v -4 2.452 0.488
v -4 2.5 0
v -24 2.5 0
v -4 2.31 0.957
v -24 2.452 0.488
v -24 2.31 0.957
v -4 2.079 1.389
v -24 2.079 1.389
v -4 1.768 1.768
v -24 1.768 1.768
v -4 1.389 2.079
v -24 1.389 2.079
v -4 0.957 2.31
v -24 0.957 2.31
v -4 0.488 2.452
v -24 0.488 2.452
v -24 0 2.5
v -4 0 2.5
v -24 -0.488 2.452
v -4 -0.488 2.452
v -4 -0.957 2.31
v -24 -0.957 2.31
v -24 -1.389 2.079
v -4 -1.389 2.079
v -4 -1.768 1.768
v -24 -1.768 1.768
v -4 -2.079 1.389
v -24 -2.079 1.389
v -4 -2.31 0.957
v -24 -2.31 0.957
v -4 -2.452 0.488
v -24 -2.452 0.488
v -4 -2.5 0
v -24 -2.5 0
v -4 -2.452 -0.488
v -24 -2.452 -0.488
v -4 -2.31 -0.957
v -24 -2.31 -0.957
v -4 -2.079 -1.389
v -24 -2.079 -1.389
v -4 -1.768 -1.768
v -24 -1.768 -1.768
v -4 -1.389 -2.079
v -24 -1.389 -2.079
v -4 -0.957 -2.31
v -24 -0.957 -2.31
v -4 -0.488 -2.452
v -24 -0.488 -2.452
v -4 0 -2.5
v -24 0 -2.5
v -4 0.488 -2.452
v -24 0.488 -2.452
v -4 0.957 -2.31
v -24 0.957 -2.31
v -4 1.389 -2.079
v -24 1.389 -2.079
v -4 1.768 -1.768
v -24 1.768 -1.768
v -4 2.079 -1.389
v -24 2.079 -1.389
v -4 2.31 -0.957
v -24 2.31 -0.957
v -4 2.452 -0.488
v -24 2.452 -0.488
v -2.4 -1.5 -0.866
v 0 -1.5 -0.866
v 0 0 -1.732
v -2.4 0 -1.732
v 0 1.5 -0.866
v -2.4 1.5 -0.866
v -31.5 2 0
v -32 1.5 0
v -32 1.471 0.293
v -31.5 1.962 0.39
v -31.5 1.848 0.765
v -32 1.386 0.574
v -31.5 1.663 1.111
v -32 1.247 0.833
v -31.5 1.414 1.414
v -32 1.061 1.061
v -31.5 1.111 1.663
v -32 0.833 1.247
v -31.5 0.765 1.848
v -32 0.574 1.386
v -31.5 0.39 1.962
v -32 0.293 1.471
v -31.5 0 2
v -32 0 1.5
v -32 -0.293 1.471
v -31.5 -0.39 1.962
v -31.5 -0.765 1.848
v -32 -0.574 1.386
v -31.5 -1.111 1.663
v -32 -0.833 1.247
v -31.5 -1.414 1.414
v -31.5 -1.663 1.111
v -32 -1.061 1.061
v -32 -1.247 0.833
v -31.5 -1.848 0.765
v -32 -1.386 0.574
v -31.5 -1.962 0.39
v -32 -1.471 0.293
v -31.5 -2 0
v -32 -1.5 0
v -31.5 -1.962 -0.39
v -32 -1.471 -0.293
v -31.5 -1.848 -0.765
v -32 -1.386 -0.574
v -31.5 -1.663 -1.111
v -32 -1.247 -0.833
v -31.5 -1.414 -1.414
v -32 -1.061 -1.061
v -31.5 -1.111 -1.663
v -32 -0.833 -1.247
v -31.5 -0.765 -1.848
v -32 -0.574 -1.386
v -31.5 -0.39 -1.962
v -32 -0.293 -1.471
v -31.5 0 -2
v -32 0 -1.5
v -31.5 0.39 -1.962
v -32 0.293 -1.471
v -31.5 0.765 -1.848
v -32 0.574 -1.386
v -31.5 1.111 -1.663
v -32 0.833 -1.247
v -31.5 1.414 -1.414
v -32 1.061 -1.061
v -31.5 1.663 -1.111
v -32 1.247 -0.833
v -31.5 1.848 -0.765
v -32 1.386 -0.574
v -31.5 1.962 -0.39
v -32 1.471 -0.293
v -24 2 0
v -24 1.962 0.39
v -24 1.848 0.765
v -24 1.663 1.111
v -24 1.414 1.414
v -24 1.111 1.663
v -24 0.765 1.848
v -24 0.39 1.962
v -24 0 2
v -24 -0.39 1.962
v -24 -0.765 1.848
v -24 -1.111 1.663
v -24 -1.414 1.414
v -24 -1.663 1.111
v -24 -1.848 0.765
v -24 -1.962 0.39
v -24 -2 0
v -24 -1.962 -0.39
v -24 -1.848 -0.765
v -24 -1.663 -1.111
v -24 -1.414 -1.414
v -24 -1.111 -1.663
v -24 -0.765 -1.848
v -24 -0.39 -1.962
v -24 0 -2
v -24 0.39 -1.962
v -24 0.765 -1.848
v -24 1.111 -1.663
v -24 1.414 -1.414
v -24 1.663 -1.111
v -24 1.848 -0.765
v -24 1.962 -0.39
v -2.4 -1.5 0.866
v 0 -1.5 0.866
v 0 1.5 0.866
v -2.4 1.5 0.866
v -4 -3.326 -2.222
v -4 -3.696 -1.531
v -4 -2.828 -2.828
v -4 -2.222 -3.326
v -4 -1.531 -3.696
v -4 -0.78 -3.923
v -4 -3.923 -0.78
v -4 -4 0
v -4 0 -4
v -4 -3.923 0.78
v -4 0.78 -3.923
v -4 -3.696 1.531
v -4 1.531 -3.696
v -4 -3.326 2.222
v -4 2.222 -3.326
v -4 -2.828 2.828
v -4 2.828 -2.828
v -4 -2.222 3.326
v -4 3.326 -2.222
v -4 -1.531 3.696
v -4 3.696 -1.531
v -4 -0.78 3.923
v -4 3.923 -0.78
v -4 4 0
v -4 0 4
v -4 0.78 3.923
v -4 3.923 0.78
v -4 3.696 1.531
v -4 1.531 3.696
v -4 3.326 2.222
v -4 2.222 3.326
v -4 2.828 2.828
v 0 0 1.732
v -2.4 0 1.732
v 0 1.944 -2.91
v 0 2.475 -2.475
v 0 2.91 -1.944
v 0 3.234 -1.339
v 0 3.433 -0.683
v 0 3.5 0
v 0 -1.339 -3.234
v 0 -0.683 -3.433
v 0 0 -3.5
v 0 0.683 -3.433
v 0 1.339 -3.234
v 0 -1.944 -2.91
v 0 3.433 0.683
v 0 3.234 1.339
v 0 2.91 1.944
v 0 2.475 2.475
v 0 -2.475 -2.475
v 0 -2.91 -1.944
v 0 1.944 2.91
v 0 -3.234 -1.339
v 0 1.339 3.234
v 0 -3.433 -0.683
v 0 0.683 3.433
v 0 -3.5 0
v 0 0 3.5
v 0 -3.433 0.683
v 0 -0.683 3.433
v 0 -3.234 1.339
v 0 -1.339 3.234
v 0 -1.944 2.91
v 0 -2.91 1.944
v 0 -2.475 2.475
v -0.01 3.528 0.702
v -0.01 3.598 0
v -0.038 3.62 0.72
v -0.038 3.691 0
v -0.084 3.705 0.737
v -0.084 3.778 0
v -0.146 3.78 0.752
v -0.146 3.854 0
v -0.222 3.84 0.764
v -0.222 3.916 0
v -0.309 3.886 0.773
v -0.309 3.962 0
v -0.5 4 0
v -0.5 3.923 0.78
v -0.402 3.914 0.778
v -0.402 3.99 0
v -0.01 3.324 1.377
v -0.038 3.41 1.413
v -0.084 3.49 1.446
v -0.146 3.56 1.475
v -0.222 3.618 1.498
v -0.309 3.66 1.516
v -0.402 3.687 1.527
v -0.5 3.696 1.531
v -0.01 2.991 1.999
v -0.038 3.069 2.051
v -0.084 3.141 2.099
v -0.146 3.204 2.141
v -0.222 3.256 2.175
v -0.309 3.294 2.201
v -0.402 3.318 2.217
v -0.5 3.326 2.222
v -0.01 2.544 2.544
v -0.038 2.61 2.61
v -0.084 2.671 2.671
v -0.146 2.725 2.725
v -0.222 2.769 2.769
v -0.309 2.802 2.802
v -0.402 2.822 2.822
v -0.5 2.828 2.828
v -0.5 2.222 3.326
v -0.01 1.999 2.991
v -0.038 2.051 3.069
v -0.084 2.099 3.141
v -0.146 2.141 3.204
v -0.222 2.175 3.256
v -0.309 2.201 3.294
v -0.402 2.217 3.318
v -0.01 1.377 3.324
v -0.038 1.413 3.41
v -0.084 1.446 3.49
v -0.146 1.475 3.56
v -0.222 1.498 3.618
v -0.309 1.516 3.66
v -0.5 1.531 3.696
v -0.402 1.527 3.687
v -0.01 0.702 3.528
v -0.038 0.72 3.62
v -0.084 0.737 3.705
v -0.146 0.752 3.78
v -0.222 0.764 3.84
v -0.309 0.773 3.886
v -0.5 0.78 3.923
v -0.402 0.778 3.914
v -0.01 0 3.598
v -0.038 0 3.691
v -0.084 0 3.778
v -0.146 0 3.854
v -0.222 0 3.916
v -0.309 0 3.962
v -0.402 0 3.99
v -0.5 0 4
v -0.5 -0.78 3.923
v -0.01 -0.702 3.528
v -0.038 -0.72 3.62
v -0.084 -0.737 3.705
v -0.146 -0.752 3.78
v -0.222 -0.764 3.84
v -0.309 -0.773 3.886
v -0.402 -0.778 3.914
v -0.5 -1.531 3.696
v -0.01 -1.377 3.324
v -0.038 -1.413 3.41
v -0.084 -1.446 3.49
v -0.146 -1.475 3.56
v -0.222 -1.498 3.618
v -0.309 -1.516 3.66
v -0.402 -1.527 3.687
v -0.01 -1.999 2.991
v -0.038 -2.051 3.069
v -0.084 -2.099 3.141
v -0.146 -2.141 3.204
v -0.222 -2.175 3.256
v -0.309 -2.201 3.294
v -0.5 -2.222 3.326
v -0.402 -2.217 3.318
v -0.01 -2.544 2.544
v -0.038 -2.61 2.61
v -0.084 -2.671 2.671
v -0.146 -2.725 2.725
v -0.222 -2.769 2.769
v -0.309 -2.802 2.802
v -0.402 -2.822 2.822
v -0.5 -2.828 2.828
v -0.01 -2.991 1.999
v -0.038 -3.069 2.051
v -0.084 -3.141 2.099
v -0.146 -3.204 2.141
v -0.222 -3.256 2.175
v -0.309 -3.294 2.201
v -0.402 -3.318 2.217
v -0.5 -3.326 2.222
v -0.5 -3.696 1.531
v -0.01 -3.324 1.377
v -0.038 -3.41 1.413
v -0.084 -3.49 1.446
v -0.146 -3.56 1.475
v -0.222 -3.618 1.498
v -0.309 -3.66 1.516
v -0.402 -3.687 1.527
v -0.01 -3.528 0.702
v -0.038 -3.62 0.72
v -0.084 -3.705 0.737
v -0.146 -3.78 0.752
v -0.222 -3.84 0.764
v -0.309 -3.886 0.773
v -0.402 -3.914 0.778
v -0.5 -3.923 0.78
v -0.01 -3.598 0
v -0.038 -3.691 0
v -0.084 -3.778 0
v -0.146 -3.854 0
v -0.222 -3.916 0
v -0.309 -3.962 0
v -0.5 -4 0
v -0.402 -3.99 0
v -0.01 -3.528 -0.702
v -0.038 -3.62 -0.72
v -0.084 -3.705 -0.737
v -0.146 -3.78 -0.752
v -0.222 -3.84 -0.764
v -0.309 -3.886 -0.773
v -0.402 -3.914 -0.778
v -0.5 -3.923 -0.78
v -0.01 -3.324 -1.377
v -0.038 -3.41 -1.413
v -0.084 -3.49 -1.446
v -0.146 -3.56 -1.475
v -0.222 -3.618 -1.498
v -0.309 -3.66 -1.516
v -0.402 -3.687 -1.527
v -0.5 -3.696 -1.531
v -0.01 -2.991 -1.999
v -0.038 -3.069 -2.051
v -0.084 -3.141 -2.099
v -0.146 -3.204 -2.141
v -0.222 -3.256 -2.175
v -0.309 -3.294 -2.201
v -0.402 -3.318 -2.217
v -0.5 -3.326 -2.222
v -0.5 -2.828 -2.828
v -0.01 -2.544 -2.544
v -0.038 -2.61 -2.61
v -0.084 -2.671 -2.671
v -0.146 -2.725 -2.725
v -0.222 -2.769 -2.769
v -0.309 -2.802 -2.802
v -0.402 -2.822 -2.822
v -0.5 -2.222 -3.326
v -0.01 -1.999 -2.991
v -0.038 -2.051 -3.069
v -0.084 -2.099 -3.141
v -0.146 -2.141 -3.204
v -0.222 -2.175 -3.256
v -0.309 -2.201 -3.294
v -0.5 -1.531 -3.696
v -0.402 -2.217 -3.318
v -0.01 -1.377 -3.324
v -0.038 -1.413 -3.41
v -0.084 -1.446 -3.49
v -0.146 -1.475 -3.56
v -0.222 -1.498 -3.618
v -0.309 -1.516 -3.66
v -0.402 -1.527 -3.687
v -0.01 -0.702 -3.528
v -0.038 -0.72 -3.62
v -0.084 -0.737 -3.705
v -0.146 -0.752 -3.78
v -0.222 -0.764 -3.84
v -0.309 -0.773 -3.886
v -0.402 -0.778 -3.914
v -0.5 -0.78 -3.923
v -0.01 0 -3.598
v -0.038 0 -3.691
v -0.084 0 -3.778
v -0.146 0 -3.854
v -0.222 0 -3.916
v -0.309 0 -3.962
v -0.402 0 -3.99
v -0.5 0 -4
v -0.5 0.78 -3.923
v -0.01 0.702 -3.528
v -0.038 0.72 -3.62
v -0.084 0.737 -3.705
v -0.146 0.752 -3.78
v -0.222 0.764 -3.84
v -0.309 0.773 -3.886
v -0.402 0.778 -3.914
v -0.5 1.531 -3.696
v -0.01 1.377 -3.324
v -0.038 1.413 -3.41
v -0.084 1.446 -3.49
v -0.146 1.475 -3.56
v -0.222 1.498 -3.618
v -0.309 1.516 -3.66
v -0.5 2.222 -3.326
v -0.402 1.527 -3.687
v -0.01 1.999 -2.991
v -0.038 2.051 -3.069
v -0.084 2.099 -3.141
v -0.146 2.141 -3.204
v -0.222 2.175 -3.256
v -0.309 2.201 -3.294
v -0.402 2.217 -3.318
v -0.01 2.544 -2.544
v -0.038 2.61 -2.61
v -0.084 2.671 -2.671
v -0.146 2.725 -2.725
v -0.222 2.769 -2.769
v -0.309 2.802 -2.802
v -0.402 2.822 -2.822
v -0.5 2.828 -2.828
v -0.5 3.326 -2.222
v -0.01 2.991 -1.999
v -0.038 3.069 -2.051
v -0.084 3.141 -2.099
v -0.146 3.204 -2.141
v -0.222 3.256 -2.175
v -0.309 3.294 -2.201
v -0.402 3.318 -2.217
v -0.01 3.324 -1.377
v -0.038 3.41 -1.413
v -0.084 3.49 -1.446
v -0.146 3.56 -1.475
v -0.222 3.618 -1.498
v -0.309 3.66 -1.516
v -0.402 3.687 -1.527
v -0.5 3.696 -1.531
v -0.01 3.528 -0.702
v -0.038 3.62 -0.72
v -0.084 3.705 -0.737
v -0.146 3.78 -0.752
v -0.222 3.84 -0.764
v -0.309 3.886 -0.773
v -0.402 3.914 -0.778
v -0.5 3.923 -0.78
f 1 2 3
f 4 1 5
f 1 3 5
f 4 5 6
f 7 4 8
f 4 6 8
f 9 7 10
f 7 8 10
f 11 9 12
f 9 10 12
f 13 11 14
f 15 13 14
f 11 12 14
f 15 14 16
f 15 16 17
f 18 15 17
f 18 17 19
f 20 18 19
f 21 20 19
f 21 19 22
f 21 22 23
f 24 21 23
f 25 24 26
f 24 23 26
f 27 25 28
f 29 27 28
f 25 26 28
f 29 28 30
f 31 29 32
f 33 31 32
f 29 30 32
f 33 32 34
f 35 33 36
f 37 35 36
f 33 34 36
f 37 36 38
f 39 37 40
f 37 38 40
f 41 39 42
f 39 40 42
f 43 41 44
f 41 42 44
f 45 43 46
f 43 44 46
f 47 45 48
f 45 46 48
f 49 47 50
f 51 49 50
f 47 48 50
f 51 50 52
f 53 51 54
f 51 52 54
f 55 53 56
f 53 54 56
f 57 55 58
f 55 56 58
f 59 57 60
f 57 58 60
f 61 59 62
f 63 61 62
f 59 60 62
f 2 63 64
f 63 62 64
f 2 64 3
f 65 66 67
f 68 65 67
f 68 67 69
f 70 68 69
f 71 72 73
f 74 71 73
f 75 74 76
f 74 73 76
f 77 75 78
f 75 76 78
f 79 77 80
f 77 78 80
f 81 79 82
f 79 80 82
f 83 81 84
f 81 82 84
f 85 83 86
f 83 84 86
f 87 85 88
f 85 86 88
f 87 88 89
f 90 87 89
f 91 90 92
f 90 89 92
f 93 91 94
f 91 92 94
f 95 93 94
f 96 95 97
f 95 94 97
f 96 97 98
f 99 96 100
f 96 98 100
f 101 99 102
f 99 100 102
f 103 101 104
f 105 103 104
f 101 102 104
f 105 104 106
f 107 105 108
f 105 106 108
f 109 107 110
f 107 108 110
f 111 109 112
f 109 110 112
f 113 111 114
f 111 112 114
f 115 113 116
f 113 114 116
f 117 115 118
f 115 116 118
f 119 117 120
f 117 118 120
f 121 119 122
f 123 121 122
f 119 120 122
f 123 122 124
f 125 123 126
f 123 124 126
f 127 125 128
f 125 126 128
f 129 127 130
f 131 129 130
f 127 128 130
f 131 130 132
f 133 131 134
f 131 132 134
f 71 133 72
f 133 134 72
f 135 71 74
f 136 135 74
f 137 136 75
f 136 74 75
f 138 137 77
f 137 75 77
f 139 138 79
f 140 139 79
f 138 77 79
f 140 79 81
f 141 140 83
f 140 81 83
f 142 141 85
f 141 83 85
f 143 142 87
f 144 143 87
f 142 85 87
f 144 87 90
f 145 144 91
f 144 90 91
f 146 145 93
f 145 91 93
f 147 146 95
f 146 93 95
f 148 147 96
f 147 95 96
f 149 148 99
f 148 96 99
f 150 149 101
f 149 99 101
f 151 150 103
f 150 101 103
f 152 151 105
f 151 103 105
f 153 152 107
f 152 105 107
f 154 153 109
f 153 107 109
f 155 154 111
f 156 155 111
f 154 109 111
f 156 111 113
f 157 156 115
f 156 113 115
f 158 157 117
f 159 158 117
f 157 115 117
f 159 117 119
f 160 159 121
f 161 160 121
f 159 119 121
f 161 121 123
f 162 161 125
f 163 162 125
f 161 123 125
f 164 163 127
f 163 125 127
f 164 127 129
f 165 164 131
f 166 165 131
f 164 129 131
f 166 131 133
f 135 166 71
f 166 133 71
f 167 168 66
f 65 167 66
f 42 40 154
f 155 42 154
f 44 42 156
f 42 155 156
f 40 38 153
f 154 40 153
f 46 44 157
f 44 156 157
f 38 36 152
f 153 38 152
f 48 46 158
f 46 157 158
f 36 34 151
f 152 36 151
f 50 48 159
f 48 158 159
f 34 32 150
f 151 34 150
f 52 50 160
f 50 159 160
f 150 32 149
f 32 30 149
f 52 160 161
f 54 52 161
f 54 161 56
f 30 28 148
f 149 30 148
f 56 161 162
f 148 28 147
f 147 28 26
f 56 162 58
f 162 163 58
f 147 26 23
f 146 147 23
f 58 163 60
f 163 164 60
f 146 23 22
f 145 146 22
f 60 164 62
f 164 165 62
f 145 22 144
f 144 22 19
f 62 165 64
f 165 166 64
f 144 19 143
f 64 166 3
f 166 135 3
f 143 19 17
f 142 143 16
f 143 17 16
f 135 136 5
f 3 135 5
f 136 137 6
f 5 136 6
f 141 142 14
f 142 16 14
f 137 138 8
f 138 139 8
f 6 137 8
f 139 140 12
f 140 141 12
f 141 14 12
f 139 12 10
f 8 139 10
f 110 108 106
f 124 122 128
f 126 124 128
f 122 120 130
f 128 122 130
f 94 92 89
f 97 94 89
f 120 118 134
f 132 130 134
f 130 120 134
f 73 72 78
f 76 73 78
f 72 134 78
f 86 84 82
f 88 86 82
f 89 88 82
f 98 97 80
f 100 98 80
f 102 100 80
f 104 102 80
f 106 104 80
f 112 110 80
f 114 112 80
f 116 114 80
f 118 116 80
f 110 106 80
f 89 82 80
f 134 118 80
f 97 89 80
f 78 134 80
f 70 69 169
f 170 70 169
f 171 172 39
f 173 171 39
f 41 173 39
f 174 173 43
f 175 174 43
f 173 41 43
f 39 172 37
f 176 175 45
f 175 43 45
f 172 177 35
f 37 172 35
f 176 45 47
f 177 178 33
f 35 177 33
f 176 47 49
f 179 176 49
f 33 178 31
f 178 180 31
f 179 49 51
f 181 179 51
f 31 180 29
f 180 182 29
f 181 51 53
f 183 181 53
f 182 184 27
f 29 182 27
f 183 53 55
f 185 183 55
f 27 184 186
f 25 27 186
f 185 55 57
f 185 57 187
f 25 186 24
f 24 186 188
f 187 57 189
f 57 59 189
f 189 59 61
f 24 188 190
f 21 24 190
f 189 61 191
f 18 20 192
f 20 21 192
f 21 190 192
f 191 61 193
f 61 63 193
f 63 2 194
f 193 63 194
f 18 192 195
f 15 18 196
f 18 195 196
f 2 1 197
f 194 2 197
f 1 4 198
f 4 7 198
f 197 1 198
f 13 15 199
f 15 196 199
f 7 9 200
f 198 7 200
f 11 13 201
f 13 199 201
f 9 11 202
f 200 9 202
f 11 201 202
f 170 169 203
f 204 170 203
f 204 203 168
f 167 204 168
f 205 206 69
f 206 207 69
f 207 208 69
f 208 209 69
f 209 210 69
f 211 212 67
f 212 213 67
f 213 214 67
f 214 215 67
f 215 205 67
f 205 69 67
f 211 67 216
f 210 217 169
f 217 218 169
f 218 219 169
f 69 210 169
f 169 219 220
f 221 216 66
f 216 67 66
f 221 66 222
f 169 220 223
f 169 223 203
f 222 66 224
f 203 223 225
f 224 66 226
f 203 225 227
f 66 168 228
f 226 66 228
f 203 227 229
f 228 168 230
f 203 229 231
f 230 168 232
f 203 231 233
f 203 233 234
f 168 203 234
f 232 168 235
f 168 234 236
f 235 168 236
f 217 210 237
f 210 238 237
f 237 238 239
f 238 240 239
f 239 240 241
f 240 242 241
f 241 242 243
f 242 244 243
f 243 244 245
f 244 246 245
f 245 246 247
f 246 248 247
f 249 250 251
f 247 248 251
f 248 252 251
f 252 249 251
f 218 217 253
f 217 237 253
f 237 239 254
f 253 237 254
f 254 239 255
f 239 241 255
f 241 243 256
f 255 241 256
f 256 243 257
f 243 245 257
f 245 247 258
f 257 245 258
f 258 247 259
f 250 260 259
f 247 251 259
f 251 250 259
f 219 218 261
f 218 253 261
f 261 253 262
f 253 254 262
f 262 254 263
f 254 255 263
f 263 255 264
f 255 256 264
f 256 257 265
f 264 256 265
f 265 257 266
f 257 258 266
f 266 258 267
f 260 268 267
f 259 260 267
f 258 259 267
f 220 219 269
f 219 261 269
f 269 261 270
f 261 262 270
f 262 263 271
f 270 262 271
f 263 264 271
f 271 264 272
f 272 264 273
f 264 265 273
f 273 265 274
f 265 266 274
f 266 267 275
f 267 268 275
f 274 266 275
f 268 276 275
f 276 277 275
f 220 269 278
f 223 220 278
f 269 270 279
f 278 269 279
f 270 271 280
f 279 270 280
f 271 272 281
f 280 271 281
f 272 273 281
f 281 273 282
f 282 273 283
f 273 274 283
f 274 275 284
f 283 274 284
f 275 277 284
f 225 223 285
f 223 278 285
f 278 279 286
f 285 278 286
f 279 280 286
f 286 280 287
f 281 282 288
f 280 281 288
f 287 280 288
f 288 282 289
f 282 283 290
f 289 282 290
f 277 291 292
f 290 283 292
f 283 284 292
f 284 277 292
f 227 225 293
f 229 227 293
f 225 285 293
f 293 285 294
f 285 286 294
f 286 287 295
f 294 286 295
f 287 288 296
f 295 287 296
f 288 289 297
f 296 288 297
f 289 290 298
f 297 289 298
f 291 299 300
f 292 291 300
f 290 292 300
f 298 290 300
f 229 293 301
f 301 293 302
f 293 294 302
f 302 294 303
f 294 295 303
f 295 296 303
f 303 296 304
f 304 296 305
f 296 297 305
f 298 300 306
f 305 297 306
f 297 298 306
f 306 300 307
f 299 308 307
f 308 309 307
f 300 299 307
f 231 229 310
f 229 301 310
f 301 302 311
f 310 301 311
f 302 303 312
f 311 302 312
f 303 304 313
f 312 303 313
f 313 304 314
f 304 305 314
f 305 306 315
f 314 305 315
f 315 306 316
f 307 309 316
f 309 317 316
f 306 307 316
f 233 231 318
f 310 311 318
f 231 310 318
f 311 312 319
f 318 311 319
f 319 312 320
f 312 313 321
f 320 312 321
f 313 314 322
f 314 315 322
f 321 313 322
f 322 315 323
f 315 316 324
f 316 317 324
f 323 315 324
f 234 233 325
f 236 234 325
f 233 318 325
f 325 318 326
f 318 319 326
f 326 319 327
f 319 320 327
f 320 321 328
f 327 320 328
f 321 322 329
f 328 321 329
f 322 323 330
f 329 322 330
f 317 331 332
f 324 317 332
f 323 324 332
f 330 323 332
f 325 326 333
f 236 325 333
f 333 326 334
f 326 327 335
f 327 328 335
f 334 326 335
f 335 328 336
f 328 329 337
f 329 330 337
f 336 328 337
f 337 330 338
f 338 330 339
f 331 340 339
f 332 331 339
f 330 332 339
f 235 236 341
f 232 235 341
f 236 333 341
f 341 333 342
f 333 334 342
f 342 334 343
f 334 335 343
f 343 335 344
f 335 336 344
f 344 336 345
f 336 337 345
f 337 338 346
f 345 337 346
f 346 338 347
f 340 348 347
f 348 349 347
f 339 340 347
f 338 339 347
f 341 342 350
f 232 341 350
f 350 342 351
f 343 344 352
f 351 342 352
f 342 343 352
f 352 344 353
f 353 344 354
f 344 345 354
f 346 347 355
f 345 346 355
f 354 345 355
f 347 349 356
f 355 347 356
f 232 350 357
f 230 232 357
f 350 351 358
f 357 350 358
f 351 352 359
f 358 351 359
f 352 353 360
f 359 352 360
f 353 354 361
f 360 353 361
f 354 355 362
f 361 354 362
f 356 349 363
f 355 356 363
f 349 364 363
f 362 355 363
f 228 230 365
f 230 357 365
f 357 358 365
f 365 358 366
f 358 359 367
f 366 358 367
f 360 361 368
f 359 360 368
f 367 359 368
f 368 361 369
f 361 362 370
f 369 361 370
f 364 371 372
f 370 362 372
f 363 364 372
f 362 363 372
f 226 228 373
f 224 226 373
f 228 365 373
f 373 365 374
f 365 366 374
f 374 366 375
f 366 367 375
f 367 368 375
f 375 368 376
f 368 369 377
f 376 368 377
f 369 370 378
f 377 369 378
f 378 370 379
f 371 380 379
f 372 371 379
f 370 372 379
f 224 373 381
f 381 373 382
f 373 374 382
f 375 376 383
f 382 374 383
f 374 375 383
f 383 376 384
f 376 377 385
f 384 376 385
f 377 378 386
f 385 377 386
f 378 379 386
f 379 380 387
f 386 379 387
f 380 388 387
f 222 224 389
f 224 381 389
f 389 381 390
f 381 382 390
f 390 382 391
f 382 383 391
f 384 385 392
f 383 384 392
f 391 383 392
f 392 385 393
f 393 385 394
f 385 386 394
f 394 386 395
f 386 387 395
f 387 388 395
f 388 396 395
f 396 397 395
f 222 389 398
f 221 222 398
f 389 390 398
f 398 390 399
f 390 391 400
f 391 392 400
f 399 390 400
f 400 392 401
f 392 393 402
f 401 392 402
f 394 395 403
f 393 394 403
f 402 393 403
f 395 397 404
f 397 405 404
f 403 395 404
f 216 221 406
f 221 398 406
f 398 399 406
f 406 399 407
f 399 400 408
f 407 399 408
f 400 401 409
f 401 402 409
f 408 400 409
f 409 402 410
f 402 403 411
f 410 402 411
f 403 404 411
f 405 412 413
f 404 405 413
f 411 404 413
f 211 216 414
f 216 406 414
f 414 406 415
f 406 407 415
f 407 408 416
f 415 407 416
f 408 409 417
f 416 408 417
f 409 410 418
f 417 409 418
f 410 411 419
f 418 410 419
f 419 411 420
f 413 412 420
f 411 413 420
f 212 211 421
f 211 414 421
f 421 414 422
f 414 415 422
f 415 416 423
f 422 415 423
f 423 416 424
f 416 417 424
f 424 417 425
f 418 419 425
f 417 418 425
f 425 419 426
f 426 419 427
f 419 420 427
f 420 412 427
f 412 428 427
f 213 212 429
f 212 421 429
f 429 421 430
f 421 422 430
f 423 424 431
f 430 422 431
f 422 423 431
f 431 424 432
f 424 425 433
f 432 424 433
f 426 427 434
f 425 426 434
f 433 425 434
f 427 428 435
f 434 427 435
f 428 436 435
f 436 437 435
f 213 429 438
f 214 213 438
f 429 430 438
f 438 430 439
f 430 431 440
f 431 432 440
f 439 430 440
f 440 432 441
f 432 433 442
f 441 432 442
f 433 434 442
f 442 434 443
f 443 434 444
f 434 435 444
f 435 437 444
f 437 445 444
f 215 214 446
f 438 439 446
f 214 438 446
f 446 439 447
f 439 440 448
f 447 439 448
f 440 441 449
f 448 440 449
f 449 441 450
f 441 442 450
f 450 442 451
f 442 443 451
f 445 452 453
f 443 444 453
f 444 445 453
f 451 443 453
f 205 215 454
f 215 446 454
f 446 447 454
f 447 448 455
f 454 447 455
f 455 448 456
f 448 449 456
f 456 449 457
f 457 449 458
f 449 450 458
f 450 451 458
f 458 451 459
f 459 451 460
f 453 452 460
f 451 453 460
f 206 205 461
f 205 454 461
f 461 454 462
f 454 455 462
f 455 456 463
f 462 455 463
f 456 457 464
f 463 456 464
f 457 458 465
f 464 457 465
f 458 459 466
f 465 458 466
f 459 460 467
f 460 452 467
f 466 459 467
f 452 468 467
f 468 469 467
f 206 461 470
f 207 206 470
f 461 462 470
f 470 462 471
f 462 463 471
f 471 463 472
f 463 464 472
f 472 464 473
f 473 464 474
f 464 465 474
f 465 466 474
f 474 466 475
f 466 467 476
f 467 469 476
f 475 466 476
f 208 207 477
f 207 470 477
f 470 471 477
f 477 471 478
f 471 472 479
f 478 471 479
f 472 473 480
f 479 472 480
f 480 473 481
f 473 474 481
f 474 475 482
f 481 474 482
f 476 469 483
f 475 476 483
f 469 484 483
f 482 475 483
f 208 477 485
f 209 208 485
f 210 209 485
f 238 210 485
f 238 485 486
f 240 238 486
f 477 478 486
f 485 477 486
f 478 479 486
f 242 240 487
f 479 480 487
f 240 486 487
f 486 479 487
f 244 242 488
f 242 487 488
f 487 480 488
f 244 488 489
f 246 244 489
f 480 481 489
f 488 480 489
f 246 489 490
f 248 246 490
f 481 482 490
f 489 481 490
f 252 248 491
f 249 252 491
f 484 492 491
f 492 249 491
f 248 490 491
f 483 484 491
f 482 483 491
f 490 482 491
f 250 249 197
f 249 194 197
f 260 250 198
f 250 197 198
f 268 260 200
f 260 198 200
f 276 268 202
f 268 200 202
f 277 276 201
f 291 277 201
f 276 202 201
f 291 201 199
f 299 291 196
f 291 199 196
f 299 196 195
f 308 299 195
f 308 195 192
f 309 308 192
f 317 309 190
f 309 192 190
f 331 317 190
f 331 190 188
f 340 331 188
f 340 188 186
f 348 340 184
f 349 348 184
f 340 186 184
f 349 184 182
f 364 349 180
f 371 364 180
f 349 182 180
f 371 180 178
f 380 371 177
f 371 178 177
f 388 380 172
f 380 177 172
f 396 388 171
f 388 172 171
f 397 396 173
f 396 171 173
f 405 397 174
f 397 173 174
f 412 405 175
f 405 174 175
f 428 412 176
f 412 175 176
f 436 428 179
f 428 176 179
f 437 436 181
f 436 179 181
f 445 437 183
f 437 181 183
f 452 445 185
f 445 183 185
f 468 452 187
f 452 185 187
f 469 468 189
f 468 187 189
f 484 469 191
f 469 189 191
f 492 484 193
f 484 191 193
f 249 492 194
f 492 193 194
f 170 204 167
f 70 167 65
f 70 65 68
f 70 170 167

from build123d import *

# Parameters (mm, degrees)
CHAMFER1_SIZE      = 0.5
CUT_EXTRUDE1_DEPTH = 2.4


with BuildPart() as part:
    # Sketch1 → Revolve1 (revolve)
    with BuildSketch(Plane.XY):
        with BuildLine():
            Line((0, 0), (0, 3.5))
            ThreePointArc((0, 3.5), (-0.146446609, 3.853553391), (-0.5, 4))
            Line((-0.5, 4), (-4, 4))
            Line((-4, 4), (-4, 2.5))
            Line((-4, 2.5), (-24, 2.5))
            Line((-24, 2.5), (-24, 2))
            Line((-24, 2), (-32, 2))
            Line((-32, 2), (-32, 0))
            Line((-32, 0), (0, 0))
        make_face()
    revolve(axis=Axis((0, 0, 0), (1, 0, 0)))

    # Chamfer1
    chamfer1_edges = [part.edges().sort_by_distance(p)[0] for p in [
        (-32, -2, 0),
    ]]
    chamfer(chamfer1_edges, length=CHAMFER1_SIZE)

    # Sketch2 → Cut-Extrude1 (cut)
    with BuildSketch(Plane(origin=(0, 0, 0), x_dir=(0, 0, -1), z_dir=(1, 0, 0))):
        Polygon((1.732050808, 0), (0.866025404, 1.5), (-0.866025404, 1.5), (-1.732050808, 0), (-0.866025404, -1.5), (0.866025404, -1.5), align=None)
    extrude(amount=-CUT_EXTRUDE1_DEPTH, mode=Mode.SUBTRACT)


solid = part.part
